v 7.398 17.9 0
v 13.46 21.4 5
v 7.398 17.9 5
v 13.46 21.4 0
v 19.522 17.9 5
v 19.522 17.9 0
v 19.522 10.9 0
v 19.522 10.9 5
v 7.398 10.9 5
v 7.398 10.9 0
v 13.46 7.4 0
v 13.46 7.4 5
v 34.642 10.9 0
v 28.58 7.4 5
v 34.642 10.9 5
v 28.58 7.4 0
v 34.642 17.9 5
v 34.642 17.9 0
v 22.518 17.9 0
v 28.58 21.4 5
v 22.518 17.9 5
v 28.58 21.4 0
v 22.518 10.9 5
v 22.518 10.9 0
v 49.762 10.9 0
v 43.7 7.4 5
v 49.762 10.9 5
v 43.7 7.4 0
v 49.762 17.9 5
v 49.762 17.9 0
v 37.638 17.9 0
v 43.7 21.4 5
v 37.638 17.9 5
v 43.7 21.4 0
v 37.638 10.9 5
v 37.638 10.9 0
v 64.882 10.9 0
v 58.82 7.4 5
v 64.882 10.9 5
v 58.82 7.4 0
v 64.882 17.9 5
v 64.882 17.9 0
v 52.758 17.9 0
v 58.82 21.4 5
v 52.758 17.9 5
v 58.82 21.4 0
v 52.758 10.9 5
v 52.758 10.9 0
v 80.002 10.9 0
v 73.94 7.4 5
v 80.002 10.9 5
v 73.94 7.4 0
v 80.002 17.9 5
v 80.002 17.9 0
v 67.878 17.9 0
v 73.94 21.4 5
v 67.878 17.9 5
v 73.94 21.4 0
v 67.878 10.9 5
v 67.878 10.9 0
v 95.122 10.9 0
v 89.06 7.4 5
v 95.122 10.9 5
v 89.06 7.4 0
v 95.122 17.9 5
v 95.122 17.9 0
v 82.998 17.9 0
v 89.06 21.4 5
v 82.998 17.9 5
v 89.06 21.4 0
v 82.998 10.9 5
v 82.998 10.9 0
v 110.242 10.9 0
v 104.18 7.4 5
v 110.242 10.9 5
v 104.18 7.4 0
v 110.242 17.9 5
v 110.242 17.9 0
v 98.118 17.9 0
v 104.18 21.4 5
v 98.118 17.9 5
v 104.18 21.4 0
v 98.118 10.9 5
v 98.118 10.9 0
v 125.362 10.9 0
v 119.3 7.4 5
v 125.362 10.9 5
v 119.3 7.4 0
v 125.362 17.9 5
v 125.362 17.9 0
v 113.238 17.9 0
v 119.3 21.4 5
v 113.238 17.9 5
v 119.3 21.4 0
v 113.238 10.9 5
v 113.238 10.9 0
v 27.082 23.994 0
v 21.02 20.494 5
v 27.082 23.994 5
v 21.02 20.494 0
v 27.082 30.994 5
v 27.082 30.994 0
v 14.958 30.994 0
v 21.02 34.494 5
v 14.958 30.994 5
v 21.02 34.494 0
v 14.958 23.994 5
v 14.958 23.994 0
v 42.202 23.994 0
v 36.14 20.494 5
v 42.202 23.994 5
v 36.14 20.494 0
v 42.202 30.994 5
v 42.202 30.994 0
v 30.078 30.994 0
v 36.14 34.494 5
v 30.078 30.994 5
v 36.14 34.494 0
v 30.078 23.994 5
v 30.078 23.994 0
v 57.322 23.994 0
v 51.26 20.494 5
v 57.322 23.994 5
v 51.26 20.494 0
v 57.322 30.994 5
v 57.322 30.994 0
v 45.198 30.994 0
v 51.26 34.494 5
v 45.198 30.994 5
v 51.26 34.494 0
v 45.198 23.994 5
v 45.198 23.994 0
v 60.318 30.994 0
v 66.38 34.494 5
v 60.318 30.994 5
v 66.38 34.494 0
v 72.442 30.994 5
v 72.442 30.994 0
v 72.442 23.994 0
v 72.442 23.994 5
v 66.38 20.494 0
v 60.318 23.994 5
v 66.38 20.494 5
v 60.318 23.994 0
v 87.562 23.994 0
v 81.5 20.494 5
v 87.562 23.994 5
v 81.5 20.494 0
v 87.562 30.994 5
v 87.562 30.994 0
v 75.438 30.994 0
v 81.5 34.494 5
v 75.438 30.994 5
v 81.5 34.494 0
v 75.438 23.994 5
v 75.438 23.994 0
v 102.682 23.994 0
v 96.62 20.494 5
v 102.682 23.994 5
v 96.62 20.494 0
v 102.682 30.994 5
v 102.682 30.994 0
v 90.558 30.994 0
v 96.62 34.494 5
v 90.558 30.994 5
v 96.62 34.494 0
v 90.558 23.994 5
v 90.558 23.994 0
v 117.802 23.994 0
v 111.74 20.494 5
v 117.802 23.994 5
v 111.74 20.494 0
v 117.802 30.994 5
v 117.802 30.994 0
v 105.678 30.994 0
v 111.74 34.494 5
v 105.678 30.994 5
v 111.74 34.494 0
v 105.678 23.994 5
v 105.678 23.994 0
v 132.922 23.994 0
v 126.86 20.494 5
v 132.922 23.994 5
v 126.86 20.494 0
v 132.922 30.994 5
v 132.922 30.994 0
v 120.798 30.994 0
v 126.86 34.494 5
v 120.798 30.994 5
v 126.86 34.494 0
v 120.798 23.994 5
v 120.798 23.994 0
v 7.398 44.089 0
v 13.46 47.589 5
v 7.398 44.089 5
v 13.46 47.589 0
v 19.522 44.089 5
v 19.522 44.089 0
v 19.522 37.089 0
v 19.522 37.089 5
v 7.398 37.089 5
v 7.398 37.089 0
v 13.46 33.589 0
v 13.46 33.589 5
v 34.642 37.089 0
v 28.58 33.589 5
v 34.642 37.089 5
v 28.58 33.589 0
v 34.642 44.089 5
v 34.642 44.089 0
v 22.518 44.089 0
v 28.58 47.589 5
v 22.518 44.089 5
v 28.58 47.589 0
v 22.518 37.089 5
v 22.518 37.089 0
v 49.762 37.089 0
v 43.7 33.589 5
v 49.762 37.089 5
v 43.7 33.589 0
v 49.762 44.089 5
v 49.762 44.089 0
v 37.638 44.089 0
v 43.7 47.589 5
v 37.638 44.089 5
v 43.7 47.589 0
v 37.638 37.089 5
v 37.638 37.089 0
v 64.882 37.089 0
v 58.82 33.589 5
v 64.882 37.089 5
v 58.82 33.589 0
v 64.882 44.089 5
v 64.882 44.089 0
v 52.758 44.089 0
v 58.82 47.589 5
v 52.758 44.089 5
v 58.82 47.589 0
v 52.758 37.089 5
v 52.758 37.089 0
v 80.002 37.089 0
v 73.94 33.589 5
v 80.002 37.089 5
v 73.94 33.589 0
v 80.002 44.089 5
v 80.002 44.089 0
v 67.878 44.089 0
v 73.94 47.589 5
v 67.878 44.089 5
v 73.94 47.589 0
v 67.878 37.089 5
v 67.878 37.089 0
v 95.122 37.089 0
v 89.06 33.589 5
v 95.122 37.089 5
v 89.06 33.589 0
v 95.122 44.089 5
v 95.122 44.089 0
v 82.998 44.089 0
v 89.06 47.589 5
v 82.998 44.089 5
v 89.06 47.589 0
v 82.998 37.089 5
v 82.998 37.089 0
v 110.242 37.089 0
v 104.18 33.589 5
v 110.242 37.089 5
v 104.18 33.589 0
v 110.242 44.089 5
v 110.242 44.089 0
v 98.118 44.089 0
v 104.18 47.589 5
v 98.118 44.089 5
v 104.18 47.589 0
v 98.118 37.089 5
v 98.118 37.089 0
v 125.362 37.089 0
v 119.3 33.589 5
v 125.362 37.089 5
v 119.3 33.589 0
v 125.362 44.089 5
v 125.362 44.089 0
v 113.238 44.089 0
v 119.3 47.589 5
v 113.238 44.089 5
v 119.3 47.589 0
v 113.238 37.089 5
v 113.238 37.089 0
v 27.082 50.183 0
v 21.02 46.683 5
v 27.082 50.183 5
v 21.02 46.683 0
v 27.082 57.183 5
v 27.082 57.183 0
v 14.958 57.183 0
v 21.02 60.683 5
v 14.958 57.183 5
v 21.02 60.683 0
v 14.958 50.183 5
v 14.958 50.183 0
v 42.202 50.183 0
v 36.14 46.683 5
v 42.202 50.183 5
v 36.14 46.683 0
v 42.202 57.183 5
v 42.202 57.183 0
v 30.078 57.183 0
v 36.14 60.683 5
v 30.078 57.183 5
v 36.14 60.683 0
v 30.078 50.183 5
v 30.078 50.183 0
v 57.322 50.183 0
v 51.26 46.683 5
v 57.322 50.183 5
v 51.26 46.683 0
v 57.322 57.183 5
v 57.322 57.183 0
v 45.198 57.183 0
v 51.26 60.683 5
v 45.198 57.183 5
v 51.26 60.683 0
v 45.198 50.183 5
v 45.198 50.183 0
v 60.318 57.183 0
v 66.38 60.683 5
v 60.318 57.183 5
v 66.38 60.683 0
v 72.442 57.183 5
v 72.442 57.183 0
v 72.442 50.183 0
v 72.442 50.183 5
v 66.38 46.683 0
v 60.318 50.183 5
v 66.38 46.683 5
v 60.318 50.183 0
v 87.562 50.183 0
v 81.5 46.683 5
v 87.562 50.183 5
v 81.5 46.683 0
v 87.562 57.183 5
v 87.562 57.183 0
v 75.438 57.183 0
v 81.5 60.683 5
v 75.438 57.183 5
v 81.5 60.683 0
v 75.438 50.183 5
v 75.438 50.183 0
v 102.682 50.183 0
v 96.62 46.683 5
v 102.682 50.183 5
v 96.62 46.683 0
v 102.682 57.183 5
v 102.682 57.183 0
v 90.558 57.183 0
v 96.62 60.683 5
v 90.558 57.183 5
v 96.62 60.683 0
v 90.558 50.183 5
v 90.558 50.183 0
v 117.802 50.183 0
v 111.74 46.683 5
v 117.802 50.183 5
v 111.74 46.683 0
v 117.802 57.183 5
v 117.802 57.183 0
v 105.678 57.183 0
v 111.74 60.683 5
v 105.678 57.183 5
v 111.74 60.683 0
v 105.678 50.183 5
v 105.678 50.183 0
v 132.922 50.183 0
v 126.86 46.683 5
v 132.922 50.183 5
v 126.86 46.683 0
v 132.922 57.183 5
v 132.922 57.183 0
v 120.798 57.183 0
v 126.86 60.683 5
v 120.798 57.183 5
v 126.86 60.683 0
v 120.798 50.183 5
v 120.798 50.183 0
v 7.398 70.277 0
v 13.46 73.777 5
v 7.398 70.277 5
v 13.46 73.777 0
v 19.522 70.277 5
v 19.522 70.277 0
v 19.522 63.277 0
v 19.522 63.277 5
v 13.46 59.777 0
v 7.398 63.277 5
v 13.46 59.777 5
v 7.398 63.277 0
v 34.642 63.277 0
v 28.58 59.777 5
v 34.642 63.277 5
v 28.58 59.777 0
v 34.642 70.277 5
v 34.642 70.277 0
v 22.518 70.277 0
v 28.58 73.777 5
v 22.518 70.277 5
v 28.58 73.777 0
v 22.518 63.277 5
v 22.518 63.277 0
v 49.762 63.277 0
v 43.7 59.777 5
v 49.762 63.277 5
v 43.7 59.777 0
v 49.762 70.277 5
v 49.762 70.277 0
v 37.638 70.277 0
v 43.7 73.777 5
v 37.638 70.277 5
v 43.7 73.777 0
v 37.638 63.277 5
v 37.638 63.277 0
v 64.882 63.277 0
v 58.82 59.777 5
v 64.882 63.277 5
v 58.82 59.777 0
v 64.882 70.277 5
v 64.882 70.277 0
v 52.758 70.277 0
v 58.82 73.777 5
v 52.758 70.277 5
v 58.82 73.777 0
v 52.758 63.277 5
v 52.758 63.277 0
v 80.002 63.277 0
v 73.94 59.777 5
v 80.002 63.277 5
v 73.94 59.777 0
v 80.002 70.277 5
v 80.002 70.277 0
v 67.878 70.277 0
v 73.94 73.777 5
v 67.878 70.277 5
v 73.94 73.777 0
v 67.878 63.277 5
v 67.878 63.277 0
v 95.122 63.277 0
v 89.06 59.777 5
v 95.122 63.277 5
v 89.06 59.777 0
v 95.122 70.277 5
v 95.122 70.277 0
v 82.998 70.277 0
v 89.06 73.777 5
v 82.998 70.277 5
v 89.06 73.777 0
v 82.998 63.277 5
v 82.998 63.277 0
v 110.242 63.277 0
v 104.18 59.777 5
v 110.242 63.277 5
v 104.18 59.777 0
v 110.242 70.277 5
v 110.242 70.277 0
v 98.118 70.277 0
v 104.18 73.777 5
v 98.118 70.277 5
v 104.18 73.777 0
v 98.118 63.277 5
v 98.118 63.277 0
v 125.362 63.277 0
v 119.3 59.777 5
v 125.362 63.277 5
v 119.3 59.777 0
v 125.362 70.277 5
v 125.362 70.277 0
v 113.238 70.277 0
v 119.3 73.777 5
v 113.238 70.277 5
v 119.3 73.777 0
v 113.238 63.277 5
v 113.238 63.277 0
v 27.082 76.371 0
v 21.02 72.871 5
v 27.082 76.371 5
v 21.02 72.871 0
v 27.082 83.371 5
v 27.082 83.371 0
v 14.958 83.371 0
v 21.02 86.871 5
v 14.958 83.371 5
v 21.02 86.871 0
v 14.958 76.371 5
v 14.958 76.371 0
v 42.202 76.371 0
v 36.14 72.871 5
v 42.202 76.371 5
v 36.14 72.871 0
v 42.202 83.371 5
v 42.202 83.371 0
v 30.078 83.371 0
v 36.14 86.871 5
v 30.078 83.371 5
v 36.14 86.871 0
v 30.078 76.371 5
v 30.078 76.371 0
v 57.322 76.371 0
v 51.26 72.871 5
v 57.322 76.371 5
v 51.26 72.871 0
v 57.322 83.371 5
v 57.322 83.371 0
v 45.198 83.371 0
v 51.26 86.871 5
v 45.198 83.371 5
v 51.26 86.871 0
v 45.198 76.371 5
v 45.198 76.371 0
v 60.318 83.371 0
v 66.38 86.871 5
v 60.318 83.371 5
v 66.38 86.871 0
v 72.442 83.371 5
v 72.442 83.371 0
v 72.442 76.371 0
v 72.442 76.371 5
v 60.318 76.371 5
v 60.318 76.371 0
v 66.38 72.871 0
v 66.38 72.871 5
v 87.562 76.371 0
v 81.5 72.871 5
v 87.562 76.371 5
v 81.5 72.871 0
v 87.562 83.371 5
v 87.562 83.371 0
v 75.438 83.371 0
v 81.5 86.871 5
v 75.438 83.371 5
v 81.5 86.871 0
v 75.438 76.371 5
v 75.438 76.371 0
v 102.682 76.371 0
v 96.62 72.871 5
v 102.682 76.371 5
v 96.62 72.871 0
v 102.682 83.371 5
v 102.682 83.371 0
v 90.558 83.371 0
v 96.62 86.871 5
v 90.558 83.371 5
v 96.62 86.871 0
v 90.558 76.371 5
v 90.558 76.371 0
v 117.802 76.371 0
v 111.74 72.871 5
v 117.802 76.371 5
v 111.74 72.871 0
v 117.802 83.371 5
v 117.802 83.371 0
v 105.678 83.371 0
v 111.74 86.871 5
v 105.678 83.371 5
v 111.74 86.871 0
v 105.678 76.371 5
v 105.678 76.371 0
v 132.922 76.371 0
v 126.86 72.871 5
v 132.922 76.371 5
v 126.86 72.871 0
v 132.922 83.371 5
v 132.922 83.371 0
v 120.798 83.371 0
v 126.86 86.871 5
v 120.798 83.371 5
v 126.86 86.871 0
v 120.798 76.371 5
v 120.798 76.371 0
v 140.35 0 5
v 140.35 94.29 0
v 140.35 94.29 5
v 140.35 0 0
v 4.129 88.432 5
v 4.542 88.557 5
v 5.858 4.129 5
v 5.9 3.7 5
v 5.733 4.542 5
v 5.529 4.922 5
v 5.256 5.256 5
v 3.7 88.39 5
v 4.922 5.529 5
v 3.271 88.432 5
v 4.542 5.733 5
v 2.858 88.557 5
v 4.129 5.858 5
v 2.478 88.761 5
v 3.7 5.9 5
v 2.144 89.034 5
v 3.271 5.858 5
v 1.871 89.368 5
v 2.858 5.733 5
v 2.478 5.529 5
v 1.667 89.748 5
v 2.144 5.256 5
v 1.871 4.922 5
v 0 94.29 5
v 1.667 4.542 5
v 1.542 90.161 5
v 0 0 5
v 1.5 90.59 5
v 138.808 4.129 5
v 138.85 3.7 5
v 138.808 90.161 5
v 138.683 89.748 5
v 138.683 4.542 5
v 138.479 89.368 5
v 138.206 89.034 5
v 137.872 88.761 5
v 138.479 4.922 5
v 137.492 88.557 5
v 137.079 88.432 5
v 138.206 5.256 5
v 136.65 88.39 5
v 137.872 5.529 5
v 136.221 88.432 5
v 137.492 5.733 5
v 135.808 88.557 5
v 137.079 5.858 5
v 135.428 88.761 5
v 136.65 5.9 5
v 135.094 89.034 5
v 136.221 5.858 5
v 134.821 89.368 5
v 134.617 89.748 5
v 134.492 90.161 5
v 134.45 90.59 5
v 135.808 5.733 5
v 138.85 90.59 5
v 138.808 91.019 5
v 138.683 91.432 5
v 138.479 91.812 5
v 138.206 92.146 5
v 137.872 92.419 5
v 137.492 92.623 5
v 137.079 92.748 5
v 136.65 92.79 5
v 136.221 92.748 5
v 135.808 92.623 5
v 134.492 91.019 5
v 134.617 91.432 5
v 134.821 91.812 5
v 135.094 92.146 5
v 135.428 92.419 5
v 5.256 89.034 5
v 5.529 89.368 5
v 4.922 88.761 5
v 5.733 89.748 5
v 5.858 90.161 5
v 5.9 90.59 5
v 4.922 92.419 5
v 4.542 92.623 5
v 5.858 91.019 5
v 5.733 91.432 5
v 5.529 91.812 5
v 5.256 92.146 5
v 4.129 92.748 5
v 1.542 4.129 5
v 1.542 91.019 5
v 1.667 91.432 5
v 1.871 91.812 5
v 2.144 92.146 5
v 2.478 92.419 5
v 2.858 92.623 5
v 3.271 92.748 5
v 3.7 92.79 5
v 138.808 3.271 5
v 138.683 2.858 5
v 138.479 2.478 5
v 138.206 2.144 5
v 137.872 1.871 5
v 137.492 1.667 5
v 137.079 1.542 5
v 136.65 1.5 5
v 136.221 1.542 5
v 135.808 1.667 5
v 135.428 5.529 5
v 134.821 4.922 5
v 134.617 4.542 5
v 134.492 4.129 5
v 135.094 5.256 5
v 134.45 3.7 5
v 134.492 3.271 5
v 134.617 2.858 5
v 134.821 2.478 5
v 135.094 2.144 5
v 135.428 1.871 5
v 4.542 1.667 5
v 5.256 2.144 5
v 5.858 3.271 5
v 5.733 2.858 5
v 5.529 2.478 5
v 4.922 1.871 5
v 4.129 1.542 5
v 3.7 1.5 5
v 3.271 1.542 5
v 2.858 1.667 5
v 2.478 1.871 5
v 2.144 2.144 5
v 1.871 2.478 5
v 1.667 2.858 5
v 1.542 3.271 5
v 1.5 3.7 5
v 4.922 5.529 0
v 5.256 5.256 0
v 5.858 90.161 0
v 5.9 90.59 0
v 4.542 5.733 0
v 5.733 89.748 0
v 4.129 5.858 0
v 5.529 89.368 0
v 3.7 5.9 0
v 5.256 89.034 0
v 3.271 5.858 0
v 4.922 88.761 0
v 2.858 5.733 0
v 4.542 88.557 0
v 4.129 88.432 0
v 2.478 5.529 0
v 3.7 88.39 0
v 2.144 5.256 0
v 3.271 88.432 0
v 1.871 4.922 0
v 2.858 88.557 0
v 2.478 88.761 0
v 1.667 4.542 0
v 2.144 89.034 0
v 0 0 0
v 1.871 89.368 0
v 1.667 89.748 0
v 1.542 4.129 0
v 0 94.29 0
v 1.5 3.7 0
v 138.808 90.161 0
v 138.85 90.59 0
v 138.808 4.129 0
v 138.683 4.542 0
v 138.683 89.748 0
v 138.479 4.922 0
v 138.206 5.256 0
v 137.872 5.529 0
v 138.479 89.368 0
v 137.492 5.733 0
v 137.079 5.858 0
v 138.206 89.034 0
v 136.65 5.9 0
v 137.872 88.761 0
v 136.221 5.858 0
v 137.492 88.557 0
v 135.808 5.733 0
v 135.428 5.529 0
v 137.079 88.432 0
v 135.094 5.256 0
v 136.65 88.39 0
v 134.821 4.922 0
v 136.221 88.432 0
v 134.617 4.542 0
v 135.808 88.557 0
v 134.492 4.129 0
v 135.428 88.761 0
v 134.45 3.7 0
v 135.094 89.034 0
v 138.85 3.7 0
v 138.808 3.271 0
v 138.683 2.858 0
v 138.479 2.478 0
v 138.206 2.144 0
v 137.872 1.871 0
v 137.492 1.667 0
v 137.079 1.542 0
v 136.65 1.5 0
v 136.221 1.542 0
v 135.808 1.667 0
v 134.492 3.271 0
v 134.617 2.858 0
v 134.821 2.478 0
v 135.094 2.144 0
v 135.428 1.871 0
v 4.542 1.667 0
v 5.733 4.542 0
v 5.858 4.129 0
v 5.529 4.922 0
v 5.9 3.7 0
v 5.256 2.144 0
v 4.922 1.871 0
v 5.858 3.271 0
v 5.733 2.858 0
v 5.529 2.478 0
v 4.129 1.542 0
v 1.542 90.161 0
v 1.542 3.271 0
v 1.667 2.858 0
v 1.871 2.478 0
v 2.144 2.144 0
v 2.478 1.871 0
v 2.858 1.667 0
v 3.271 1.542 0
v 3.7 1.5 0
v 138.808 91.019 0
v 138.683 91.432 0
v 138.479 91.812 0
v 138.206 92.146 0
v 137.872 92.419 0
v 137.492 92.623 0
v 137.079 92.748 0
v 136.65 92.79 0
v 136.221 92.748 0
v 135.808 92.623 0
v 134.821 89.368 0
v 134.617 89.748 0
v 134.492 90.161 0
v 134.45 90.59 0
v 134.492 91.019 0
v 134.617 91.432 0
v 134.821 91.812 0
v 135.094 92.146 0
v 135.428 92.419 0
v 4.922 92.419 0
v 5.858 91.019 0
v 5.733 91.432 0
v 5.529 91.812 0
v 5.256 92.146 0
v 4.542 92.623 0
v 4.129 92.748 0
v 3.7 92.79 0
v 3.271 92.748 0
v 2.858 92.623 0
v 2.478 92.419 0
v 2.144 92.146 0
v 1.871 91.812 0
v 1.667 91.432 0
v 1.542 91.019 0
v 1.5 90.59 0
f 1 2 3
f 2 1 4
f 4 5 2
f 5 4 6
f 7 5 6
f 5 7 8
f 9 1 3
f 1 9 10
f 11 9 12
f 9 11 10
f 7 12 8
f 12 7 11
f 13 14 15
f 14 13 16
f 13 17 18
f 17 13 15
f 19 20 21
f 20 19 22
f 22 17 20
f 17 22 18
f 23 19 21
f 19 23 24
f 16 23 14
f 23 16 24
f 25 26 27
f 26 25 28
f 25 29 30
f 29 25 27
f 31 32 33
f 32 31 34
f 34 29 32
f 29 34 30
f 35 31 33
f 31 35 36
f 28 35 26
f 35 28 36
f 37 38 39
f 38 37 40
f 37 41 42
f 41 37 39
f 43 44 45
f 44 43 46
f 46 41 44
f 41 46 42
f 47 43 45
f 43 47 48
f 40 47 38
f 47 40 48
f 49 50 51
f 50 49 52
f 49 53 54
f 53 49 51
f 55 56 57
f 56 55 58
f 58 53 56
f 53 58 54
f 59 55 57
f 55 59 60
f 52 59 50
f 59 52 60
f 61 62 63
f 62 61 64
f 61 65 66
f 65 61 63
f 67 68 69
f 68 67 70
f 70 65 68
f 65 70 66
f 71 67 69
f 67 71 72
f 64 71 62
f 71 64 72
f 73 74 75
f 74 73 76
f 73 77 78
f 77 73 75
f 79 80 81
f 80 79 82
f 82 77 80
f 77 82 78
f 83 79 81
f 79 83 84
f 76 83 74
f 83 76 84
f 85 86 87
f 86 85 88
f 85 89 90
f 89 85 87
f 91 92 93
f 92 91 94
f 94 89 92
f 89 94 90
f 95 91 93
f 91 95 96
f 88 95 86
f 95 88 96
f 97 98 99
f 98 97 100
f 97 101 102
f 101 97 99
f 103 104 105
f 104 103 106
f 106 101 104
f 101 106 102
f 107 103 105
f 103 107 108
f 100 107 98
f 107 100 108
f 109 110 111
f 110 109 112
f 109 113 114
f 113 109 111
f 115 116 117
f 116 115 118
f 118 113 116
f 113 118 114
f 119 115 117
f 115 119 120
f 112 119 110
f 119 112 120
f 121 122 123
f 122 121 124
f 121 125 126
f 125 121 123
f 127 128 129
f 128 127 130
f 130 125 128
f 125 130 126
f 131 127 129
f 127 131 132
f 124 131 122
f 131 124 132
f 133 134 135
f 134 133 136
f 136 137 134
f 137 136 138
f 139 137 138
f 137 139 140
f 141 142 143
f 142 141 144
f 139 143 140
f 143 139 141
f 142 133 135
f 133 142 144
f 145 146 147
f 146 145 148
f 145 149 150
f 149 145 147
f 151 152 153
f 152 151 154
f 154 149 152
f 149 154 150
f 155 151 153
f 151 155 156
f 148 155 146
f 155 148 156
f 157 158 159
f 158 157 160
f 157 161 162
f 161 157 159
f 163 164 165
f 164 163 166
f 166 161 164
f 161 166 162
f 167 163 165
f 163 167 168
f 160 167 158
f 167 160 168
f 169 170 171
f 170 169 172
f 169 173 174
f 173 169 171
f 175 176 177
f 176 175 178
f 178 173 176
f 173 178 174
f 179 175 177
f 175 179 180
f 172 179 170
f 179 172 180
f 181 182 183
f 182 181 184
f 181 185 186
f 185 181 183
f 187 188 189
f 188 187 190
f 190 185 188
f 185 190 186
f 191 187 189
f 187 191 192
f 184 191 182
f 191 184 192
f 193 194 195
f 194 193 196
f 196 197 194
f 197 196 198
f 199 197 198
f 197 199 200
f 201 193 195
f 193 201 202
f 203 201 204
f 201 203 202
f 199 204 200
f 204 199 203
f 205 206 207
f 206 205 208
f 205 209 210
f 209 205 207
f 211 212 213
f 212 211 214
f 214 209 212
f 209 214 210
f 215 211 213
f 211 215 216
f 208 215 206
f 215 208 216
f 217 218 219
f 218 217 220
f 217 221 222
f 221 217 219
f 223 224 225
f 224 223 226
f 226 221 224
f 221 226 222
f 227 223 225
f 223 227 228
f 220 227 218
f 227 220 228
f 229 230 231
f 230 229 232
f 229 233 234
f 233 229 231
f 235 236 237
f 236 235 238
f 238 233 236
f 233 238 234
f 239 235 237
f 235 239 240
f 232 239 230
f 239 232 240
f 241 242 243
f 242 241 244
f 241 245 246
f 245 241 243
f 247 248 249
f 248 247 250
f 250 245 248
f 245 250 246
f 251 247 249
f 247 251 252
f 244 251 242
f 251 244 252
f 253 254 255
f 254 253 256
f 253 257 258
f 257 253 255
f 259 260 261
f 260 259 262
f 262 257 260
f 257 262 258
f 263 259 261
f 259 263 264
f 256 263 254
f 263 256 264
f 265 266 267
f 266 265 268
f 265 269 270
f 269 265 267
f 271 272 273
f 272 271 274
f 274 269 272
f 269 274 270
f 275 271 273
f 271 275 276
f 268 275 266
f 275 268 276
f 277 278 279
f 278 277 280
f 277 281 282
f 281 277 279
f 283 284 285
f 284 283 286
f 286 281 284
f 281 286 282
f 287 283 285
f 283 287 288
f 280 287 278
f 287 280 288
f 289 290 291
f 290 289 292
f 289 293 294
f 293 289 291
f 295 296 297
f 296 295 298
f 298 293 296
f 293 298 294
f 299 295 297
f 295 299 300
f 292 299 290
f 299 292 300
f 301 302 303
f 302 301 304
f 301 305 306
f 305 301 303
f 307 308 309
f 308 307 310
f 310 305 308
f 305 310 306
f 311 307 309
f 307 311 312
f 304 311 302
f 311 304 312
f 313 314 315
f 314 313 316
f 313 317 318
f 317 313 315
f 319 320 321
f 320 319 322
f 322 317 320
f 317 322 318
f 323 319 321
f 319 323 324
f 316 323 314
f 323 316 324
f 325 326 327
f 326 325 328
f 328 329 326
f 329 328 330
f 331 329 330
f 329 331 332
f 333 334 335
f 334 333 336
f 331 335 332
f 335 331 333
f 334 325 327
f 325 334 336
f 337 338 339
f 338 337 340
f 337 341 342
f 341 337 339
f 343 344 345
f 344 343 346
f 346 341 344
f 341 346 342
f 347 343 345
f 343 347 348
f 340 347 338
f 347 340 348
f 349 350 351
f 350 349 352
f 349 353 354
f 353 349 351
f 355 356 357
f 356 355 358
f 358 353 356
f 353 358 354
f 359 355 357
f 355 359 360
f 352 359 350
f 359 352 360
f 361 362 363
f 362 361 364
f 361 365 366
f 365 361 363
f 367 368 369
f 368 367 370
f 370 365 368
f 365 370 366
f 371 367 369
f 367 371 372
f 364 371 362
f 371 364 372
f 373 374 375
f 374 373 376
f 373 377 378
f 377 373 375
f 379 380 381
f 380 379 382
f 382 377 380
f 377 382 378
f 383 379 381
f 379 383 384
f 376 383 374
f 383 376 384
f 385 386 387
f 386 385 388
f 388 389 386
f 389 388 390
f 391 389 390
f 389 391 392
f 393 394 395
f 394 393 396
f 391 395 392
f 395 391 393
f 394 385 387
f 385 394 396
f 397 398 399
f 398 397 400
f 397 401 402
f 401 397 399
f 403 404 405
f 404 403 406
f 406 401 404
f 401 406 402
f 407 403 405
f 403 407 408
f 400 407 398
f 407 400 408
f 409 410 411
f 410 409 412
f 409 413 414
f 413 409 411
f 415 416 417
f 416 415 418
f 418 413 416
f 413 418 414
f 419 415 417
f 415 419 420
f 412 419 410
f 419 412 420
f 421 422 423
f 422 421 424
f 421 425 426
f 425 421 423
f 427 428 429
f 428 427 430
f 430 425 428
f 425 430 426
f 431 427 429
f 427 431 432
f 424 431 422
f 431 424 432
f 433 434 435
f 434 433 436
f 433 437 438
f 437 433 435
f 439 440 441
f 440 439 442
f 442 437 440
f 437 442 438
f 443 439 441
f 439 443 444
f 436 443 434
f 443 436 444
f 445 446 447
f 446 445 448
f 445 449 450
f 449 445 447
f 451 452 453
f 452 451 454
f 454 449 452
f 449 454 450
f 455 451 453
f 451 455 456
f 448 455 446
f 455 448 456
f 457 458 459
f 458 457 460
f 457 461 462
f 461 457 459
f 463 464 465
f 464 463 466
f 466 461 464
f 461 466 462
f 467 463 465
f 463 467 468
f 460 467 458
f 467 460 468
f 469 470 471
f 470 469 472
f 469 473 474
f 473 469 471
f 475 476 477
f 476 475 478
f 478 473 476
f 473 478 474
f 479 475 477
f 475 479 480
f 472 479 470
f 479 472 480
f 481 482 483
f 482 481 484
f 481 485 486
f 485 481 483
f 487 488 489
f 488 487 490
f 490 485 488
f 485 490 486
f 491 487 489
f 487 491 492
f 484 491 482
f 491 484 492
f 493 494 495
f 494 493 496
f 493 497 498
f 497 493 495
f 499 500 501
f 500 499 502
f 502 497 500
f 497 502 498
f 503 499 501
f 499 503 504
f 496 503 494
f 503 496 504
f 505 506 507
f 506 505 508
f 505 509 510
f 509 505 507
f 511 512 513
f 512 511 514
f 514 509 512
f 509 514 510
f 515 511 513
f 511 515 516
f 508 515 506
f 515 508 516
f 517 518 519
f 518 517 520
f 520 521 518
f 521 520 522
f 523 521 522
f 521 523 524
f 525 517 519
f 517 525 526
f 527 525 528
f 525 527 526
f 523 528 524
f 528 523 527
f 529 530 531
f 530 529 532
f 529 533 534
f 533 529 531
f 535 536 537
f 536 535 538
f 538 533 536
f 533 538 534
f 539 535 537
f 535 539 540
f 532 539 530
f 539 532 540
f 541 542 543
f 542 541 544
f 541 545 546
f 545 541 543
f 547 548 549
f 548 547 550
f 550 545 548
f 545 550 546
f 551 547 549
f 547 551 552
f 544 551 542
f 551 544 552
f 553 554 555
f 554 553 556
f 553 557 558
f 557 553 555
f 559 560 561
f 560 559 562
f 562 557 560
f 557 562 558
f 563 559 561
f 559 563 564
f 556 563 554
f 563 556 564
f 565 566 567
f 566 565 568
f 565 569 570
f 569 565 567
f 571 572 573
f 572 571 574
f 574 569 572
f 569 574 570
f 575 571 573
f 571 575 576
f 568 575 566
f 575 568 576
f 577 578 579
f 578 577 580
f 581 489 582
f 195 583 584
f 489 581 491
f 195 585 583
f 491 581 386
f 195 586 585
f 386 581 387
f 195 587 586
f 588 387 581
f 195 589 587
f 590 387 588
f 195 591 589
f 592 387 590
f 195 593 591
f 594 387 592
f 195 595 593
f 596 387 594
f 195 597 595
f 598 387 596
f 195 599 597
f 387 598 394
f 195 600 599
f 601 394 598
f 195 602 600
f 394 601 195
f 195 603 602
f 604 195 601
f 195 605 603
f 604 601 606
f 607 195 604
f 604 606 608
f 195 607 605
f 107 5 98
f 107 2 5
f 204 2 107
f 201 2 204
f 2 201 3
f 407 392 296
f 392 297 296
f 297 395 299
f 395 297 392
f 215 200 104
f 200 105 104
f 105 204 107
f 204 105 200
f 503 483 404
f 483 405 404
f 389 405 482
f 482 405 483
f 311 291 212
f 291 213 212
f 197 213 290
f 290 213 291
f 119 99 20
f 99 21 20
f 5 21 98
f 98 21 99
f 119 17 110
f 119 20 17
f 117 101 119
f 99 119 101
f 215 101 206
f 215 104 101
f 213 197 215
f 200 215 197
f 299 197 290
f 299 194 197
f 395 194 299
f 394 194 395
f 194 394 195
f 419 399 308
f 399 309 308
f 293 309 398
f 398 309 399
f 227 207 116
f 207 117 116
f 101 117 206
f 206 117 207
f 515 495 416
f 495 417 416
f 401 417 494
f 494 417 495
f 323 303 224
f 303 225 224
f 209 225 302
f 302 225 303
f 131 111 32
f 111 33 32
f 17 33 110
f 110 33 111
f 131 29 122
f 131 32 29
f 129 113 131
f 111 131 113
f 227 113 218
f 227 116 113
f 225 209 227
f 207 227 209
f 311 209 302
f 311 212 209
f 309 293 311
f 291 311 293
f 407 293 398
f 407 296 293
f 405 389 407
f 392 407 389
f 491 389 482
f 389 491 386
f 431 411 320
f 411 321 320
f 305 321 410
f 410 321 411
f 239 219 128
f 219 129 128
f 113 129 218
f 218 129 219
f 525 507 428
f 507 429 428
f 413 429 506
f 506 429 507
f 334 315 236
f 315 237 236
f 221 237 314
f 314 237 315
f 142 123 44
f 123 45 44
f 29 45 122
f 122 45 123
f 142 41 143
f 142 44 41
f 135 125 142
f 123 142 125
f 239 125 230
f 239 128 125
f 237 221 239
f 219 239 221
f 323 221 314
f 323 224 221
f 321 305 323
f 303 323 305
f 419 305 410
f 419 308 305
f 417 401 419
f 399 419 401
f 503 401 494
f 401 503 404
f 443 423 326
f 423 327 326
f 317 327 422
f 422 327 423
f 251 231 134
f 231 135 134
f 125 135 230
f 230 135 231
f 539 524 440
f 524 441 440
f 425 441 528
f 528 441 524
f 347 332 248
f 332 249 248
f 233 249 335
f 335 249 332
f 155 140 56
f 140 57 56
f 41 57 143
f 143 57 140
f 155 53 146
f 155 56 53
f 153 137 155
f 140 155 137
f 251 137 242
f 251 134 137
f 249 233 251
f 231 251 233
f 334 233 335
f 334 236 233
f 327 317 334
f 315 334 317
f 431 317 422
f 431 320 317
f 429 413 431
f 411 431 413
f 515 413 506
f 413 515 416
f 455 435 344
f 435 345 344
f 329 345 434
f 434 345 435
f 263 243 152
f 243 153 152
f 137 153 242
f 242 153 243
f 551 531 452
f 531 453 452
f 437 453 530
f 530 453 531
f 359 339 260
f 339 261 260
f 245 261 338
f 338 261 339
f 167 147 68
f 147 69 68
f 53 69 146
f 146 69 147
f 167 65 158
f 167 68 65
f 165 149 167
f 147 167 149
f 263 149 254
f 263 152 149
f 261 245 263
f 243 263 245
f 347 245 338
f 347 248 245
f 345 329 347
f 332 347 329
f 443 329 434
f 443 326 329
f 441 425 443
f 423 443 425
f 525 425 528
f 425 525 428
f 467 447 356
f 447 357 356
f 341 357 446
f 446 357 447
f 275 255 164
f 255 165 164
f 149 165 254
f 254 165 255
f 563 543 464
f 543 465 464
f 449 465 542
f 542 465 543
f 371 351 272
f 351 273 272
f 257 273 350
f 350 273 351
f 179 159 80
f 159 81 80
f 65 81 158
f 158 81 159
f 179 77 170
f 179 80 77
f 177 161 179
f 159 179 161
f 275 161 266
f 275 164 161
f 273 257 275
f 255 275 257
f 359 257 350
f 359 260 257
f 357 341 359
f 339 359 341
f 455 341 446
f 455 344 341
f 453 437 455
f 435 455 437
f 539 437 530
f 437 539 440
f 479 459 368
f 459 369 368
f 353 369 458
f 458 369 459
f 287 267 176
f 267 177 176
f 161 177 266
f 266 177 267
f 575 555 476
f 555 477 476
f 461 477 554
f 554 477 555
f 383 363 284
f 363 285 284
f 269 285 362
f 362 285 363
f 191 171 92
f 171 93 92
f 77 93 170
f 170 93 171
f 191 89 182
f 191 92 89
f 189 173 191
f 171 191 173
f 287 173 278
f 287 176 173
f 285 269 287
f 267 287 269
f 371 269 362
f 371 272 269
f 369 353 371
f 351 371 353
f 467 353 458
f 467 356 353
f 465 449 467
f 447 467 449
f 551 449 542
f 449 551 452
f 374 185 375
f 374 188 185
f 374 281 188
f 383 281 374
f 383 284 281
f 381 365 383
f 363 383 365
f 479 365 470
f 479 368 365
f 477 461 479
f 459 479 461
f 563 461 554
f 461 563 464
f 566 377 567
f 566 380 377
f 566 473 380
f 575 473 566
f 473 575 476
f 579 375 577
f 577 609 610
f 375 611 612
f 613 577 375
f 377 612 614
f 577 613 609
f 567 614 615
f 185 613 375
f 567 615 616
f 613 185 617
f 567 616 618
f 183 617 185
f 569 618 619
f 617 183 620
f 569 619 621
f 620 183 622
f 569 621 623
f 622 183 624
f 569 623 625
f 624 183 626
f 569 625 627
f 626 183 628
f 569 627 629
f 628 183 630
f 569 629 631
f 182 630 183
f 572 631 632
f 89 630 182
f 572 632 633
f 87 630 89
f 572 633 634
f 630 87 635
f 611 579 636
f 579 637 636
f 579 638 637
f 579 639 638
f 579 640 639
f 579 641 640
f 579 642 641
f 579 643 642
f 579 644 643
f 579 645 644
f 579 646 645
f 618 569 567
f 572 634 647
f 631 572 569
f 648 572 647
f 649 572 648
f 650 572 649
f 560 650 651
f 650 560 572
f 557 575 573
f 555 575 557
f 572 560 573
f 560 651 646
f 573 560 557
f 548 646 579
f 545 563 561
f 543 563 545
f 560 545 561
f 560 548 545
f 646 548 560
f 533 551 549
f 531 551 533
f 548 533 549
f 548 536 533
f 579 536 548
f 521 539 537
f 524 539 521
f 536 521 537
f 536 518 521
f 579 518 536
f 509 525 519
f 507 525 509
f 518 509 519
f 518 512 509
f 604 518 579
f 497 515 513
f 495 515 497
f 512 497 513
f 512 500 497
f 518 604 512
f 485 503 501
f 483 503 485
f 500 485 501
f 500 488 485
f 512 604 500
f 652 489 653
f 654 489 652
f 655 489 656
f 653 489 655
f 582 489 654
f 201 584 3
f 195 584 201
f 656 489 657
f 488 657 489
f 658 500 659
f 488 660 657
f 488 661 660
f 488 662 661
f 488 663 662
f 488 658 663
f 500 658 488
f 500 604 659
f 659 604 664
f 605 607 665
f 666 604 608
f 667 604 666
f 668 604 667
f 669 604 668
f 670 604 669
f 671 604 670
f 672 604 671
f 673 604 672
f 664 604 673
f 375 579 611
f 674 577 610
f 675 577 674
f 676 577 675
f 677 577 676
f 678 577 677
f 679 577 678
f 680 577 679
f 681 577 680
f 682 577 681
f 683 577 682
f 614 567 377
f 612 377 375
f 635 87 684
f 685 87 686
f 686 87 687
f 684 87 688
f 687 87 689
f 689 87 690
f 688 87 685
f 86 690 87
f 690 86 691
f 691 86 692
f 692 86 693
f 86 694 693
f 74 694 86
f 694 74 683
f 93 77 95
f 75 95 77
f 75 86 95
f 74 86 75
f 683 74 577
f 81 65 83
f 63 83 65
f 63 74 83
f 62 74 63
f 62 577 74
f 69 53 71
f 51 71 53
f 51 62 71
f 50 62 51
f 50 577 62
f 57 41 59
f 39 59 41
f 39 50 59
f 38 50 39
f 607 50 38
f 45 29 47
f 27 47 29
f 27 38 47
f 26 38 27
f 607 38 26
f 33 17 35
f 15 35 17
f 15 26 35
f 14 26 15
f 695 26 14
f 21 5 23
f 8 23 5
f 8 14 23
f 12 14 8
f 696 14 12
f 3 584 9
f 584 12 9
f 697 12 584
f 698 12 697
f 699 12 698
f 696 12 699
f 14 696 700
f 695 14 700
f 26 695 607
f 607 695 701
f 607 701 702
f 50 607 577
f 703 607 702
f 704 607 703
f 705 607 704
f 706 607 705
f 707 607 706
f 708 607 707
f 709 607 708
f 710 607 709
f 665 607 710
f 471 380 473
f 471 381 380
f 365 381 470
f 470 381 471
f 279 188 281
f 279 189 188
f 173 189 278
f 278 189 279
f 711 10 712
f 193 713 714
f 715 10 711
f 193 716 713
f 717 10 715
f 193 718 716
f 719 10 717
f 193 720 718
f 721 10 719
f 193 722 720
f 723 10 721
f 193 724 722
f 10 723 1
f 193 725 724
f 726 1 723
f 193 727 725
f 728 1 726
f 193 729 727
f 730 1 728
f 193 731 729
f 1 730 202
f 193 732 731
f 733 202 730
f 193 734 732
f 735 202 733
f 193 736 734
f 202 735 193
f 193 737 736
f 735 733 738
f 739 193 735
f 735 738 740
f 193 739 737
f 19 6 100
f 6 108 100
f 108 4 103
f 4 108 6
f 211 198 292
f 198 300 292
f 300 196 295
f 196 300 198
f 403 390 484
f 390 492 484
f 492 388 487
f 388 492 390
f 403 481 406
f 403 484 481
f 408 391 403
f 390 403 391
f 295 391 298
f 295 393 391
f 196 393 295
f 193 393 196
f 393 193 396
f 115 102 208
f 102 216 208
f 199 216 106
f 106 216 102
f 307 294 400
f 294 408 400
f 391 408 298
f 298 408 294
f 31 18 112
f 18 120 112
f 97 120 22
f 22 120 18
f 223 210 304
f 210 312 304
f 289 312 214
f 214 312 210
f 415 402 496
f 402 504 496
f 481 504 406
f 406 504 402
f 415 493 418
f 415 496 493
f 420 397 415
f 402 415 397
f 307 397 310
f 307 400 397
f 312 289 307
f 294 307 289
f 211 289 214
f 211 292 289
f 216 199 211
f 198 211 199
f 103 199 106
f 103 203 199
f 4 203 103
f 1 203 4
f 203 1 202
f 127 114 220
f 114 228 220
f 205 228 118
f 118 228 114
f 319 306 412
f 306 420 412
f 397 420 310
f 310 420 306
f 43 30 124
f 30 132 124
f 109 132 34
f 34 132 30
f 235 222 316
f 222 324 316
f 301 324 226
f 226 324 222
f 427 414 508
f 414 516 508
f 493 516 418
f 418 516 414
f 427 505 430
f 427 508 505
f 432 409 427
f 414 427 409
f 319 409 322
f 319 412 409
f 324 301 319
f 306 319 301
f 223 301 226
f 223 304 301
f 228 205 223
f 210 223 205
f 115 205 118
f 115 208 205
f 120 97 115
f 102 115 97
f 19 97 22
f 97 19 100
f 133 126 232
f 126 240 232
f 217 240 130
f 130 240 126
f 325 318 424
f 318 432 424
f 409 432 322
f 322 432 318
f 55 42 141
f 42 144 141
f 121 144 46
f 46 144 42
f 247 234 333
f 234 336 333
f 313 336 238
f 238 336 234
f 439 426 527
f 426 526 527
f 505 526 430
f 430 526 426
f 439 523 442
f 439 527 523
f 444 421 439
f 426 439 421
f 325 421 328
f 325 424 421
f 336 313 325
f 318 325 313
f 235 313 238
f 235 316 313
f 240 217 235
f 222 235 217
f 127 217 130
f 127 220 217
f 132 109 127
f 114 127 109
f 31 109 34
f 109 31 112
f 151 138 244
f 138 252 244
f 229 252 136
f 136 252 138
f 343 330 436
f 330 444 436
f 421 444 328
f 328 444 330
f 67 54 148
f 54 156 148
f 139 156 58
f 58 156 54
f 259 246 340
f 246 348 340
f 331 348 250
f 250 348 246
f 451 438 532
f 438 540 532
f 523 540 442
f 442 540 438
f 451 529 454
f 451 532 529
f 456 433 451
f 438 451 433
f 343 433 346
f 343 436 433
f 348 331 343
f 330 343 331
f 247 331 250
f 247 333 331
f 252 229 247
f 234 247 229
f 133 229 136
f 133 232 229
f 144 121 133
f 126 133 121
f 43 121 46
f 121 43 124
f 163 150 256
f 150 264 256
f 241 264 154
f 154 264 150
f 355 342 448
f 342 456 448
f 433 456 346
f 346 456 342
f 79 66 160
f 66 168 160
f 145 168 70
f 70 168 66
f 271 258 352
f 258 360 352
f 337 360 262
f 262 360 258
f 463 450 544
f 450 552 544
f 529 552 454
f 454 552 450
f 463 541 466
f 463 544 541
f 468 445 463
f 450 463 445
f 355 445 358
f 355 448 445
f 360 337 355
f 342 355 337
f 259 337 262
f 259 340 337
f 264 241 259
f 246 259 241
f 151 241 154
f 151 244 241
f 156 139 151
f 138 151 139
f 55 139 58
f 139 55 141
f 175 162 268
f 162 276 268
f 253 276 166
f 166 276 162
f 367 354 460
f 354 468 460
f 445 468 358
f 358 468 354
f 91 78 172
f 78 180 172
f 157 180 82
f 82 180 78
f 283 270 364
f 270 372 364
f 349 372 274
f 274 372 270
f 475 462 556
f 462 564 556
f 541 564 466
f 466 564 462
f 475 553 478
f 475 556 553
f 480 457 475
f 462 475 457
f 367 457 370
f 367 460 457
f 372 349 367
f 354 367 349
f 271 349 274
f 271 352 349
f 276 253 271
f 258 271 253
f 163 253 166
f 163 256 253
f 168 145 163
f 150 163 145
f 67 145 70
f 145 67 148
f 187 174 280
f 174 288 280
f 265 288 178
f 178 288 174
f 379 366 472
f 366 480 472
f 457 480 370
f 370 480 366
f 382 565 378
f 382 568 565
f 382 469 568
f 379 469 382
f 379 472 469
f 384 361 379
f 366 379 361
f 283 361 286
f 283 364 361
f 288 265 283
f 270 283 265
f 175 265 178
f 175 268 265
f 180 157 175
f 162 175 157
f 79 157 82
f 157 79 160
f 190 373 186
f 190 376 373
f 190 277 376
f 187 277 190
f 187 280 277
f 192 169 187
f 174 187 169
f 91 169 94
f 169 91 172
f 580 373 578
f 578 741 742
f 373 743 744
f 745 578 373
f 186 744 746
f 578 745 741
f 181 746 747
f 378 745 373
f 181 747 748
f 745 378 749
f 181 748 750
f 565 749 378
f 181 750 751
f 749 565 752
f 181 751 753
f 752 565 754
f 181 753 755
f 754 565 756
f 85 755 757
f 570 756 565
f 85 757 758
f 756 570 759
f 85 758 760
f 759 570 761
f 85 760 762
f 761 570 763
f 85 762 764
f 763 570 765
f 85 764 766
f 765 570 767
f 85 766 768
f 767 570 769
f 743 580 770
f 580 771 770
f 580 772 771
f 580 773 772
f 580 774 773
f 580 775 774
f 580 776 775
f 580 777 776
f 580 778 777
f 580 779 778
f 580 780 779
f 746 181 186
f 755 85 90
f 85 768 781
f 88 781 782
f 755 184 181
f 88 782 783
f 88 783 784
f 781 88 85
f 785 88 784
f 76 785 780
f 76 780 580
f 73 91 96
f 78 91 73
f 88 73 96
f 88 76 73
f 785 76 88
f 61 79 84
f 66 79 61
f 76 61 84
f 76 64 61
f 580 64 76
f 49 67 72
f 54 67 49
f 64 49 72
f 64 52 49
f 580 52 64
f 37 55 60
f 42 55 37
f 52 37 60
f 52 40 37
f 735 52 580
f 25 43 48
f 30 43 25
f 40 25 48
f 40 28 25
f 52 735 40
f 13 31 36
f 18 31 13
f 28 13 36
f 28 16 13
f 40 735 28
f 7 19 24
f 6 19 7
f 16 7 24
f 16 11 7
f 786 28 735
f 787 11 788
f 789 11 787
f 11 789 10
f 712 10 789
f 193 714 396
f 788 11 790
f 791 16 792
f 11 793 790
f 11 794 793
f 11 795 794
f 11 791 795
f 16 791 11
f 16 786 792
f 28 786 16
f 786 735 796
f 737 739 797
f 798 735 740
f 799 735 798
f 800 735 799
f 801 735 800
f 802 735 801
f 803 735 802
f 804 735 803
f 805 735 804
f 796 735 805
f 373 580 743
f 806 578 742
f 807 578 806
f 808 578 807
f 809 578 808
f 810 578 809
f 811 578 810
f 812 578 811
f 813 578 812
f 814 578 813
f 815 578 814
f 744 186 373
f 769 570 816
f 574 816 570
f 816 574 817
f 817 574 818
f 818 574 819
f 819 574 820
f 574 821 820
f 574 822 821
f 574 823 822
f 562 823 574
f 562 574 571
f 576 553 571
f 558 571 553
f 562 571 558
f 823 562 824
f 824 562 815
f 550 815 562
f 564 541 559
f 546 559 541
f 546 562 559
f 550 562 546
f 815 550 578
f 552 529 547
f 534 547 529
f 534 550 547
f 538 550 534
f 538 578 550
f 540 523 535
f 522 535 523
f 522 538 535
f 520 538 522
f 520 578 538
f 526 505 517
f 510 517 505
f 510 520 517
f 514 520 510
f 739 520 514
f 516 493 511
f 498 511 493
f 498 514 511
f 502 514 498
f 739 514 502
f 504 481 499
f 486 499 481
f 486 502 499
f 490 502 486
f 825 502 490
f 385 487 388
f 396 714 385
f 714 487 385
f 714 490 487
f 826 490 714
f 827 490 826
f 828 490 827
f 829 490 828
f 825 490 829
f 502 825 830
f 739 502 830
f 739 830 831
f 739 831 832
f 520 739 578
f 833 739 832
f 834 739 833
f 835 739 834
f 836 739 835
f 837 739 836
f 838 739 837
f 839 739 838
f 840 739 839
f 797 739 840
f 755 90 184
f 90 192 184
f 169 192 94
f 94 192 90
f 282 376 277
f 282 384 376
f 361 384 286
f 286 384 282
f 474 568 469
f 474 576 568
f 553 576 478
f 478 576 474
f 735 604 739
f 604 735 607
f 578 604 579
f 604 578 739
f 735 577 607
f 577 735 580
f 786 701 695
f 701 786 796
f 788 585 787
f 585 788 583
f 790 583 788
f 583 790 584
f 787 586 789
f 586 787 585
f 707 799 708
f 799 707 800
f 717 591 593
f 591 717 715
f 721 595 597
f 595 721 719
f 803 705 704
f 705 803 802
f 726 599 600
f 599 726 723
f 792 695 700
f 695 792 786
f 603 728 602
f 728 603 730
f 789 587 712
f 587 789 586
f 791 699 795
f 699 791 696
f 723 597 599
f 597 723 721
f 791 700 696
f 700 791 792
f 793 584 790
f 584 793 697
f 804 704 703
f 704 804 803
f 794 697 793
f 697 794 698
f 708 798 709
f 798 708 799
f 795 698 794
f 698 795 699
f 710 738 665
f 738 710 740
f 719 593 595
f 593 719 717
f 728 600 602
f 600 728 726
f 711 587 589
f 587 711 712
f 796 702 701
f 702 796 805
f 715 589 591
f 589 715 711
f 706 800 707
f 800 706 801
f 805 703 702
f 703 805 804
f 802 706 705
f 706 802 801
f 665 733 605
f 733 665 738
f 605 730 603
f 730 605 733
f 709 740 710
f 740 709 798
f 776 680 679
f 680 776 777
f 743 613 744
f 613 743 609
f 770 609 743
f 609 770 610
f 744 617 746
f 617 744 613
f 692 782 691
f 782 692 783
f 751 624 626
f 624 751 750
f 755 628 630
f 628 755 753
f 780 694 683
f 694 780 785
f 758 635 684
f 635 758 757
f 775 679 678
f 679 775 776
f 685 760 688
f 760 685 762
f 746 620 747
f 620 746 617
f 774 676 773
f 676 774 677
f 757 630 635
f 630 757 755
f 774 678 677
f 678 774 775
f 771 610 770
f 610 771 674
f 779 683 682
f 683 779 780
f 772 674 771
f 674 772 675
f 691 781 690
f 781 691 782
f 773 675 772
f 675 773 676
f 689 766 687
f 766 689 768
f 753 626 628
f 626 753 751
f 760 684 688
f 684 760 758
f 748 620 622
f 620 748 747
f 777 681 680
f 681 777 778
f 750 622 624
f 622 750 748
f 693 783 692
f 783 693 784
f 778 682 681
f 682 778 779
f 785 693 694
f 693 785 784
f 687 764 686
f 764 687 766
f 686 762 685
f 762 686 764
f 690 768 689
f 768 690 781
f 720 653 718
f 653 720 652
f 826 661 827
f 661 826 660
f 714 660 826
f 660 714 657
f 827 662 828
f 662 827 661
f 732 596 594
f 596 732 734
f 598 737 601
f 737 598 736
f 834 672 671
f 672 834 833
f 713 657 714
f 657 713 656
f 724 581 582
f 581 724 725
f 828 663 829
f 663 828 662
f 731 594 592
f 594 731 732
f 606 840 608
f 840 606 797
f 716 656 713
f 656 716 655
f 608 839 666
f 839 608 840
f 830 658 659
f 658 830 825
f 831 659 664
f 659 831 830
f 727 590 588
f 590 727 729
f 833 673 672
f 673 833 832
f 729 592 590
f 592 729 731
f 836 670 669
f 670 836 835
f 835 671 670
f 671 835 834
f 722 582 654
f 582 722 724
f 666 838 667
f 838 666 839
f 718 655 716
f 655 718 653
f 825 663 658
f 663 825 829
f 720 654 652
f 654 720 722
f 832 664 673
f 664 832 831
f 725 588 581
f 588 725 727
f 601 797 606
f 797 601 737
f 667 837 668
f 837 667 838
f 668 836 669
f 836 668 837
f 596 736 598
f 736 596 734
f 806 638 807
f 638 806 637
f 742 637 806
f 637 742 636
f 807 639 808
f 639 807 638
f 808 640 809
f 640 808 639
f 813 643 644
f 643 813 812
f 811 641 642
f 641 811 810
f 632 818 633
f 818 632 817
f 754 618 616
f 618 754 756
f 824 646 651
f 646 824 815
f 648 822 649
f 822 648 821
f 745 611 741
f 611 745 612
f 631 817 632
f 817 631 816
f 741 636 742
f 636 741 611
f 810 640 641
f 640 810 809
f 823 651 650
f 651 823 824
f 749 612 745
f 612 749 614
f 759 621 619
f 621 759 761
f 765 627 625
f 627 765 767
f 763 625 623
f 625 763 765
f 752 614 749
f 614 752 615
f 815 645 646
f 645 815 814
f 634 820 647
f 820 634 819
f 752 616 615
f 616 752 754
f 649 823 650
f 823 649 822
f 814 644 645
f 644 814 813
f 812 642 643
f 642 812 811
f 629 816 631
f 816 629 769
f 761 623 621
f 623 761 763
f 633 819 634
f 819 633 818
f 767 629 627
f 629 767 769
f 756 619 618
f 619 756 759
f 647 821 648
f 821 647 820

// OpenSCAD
$fn = 32;

// ----------------------------------------------------------------------
// Honeycomb panel: 140.35 x 94.29 mm, 48 cells of 14 mm
// ----------------------------------------------------------------------

// --- parameters (mm) ---
panel_w = 140.35;         // panel width
panel_d = 94.29;          // panel depth
thick = 5;                // panel thickness
cell_r = 7;               // hex cell circumradius
pitch = 15.12;            // hex cell pitch (centre to centre)
web = 3;                  // web between the cells
columns = 8;              // columns of cells
rows = 6;                 // rows of cells
cell_count = 48;          // total cells
shift_x = 13.46;          // first cell offset in x
shift_y = 14.4;           // first cell offset in y
mount_d = 4.4;            // corner mounting holes
hole_off = 3.7;           // mounting hole offset from the corners

difference() {
  union() {
    cube([panel_w, panel_d, thick]);
  }
  /* hexagonal cells, point-up, cut right through the plate */
  for (row = [0 : rows - 1]) {
    for (col = [0 : columns - 1]) {
      translate([shift_x + col * pitch + (row % 2) * pitch / 2, shift_y + row * pitch * 0.866025, -2.5]) rotate([0, 0, 30]) cylinder(h = thick + 5, d = 2 * cell_r, $fn = 6);
    }
  }
  /* corner mounting holes, clear of the outer cell web */
  translate([3.7, 3.7, -2.5]) cylinder(h = thick + 5, d = mount_d);
  translate([136.65, 3.7, -2.5]) cylinder(h = thick + 5, d = mount_d);
  translate([3.7, 90.59, -2.5]) cylinder(h = thick + 5, d = mount_d);
  translate([136.65, 90.59, -2.5]) cylinder(h = thick + 5, d = mount_d);
}
